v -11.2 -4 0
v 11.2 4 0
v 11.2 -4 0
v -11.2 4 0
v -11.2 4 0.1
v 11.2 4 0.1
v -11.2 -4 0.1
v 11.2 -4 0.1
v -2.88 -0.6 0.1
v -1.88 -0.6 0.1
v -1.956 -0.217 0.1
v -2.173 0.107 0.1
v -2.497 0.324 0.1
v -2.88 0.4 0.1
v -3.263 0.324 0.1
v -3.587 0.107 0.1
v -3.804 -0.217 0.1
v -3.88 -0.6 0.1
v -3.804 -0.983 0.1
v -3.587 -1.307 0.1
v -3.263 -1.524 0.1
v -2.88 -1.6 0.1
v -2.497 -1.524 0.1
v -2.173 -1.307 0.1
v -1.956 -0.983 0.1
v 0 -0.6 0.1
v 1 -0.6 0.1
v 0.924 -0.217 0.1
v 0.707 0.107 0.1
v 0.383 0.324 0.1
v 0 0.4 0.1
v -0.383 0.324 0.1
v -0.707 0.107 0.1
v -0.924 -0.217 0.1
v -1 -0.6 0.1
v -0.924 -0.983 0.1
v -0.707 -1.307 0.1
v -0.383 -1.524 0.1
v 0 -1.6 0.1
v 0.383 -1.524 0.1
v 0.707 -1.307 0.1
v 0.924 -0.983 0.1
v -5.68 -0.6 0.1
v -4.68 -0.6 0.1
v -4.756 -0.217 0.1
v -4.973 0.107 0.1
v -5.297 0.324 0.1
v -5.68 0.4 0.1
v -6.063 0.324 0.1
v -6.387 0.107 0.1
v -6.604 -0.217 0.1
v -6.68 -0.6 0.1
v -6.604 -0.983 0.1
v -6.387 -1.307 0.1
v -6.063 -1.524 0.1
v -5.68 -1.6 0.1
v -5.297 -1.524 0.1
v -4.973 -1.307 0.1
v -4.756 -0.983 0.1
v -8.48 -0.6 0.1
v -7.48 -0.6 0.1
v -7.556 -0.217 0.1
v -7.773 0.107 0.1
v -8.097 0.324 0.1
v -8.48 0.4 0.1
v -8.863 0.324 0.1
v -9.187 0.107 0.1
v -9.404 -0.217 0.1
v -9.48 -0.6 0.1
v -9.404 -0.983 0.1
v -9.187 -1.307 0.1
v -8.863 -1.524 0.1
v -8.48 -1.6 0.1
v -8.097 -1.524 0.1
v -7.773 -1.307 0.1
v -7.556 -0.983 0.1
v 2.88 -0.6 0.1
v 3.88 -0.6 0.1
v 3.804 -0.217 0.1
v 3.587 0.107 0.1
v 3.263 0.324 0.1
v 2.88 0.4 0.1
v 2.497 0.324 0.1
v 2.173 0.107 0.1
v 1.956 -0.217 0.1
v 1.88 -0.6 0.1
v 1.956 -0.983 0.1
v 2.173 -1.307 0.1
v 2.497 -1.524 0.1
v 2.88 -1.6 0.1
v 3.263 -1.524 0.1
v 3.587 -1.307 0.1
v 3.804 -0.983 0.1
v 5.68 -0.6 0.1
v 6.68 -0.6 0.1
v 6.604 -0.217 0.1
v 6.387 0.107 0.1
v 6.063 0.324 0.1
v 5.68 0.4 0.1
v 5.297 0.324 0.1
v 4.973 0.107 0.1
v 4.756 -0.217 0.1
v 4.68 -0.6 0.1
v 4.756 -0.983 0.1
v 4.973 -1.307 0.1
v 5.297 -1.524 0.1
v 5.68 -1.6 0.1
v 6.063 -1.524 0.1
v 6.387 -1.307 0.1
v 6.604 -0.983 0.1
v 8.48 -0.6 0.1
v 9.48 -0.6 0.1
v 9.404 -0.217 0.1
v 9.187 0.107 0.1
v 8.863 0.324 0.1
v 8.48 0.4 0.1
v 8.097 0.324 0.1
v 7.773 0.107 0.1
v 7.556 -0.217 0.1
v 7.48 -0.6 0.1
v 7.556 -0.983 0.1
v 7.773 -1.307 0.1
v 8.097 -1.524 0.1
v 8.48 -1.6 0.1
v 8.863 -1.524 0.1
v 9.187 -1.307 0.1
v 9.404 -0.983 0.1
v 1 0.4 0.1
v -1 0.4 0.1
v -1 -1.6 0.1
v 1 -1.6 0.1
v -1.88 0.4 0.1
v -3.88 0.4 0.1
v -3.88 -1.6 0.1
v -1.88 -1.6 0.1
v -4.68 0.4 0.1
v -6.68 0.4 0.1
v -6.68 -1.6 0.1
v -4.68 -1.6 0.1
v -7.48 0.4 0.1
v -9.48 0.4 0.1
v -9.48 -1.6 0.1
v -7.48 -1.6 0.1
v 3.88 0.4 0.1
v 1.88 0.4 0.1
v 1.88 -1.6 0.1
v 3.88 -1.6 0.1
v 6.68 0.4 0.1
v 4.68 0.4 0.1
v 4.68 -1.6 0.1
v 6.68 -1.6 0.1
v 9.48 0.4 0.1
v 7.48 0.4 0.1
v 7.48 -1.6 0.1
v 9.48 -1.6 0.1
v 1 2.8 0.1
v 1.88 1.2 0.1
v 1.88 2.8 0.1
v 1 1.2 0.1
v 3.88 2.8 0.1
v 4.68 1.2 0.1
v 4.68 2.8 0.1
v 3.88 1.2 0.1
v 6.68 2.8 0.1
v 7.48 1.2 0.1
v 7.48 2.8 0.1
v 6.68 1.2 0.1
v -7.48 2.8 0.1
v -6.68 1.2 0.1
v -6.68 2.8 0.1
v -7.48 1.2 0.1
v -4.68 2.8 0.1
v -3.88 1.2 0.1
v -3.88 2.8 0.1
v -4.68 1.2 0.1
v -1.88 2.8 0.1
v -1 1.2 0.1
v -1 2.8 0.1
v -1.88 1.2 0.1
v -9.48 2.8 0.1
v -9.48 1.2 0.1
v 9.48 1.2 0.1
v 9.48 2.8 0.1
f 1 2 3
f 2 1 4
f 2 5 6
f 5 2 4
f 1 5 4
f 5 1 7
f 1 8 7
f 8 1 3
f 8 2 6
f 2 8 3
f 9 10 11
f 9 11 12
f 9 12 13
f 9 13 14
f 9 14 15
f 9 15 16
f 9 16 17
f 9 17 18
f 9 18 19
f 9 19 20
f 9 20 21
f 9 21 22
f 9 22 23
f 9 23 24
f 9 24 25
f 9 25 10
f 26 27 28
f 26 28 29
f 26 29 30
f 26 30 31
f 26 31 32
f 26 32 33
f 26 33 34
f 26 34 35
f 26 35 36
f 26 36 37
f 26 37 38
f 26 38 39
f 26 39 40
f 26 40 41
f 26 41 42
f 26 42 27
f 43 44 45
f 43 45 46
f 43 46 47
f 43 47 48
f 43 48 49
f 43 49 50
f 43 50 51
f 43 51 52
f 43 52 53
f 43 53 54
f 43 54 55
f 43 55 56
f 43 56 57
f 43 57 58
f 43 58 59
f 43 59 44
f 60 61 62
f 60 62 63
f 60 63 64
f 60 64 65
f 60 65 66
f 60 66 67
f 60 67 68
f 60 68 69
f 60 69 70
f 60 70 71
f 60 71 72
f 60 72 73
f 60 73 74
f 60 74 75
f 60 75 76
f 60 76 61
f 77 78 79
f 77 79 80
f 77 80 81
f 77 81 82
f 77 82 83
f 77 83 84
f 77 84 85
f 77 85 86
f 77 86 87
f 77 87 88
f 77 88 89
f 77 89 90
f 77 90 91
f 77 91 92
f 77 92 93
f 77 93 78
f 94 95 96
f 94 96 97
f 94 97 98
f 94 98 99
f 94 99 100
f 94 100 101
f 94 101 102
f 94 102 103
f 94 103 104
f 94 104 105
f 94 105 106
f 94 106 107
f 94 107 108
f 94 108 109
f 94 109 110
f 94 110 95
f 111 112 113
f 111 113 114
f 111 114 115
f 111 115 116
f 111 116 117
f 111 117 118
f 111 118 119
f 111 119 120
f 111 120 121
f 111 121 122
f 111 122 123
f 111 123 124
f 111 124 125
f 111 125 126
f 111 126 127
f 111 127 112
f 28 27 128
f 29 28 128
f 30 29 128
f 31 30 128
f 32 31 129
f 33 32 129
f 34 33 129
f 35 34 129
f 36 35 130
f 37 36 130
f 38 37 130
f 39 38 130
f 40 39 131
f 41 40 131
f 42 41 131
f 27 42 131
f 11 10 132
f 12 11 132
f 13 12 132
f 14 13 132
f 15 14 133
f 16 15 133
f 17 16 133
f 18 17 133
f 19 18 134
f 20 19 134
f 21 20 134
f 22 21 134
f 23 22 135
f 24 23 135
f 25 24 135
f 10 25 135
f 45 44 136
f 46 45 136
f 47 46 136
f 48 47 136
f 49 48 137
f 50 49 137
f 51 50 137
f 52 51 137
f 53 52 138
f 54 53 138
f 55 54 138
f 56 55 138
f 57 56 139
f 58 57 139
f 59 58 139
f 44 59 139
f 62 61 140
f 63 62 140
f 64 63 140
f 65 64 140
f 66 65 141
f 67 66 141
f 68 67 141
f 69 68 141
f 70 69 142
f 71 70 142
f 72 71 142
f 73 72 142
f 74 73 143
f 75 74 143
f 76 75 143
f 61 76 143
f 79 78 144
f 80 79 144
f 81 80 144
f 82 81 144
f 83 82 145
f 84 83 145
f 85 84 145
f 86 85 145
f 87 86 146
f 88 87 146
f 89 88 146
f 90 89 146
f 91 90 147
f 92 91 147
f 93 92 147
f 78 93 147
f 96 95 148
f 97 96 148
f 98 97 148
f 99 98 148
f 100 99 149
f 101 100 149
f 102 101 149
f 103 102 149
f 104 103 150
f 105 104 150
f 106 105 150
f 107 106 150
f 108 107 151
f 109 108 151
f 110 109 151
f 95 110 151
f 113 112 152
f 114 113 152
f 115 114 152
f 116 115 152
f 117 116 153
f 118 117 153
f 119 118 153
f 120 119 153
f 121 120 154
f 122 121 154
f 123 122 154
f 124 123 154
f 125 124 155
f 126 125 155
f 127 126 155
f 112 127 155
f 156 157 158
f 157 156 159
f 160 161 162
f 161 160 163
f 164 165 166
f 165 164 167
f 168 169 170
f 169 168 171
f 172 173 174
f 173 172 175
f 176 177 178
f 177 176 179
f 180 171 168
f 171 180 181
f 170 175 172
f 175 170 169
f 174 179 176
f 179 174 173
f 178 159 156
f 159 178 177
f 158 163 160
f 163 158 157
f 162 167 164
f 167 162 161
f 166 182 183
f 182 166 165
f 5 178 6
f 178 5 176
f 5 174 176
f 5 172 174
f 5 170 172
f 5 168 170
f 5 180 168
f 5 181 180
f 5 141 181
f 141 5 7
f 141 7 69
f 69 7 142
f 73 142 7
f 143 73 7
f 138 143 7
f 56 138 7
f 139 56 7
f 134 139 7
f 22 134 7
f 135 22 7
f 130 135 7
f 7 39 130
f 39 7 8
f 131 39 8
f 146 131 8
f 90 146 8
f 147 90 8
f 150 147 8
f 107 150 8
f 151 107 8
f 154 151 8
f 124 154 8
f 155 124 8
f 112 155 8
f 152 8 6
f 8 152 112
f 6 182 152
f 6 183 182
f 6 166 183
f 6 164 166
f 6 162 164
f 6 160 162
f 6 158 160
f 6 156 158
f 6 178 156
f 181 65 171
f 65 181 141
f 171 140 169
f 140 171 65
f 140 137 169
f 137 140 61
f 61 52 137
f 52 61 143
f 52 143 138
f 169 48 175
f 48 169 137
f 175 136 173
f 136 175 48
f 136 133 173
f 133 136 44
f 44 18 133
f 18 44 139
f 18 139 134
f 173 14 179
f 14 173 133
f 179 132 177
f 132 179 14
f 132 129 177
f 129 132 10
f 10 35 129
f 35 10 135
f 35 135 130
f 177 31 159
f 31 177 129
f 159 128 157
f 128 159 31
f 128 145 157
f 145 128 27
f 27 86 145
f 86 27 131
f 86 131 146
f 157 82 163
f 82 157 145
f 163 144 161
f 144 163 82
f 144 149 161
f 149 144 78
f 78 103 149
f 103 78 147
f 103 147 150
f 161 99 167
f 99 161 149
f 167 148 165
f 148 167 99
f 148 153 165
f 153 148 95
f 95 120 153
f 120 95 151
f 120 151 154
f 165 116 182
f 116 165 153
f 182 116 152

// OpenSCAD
// file: ../p/4-4edge.scad
use <../lib.scad>
$fa=1; $fs=0.2;
function ldraw_lib__4_4edge(realsolid=false) = [
// 0 Circle 1.0
// 0 Name: 4-4edge.dat
// 0 Author: James Jessiman
// 0 !LDRAW_ORG Primitive UPDATE 2017-01
// 0 !LICENSE Licensed under CC BY 2.0 and CC BY 4.0 : see CAreadme.txt
// 
// 0 BFC CERTIFY CCW
  [0,"BFC","CERTIFY"],
  [0,"BFC","CCW"],
// 
// 0 !HISTORY 1998-12-15 [PTadmin] Official Update 1998-10
// 0 !HISTORY 2005-12-28 [PTadmin] Official Update 2005-01
// 0 !HISTORY 2007-06-24 [PTadmin] Header formatted for Contributor Agreement
// 0 !HISTORY 2008-07-01 [PTadmin] Official Update 2008-01
// 0 !HISTORY 2017-01-15 [Steffen] BFCed
// 0 !HISTORY 2017-12-30 [PTadmin] Official Update 2017-01
// 
// 
// 2 24 1 0 0 0.9239 0 0.3827
  [2,24,1,0,0,0.9239,0,0.3827],
// 2 24 0.9239 0 0.3827 0.7071 0 0.7071
  [2,24,0.9239,0,0.3827,0.7071,0,0.7071],
// 2 24 0.7071 0 0.7071 0.3827 0 0.9239
  [2,24,0.7071,0,0.7071,0.3827,0,0.9239],
// 2 24 0.3827 0 0.9239 0 0 1
  [2,24,0.3827,0,0.9239,0,0,1],
// 2 24 0 0 1 -0.3827 0 0.9239
  [2,24,0,0,1,-0.3827,0,0.9239],
// 2 24 -0.3827 0 0.9239 -0.7071 0 0.7071
  [2,24,-0.3827,0,0.9239,-0.7071,0,0.7071],
// 2 24 -0.7071 0 0.7071 -0.9239 0 0.3827
  [2,24,-0.7071,0,0.7071,-0.9239,0,0.3827],
// 2 24 -0.9239 0 0.3827 -1 0 -0
  [2,24,-0.9239,0,0.3827,-1,0,-0],
// 2 24 -1 0 -0 -0.9239 0 -0.3827
  [2,24,-1,0,-0,-0.9239,0,-0.3827],
// 2 24 -0.9239 0 -0.3827 -0.7071 0 -0.7071
  [2,24,-0.9239,0,-0.3827,-0.7071,0,-0.7071],
// 2 24 -0.7071 0 -0.7071 -0.3827 0 -0.9239
  [2,24,-0.7071,0,-0.7071,-0.3827,0,-0.9239],
// 2 24 -0.3827 0 -0.9239 0 0 -1
  [2,24,-0.3827,0,-0.9239,0,0,-1],
// 2 24 0 0 -1 0.3827 0 -0.9239
  [2,24,0,0,-1,0.3827,0,-0.9239],
// 2 24 0.3827 0 -0.9239 0.7071 0 -0.7071
  [2,24,0.3827,0,-0.9239,0.7071,0,-0.7071],
// 2 24 0.7071 0 -0.7071 0.9239 0 -0.3827
  [2,24,0.7071,0,-0.7071,0.9239,0,-0.3827],
// 2 24 0.9239 0 -0.3827 1 0 0
  [2,24,0.9239,0,-0.3827,1,0,0],
];
module ldraw_lib__4_4edge(step=0, col=false, unit=2/5, alt=false, line=0.2, solid=!$preview)
    makepoly(ldraw_lib__4_4edge(solid), step=step, col=col, unit=unit, alt=alt, line=line, solid=solid);
ldraw_lib__4_4edge(line=0.2);
// file: ../p/4-4cyli.scad
use <../lib.scad>
$fa=1; $fs=0.2;
function ldraw_lib__4_4cyli(realsolid=false) = [
// 0 Cylinder 1.0
// 0 Name: 4-4cyli.dat
// 0 Author: James Jessiman
// 0 !LDRAW_ORG Primitive UPDATE 2005-01
// 0 !LICENSE Licensed under CC BY 2.0 and CC BY 4.0 : see CAreadme.txt
// 
// 0 BFC CERTIFY CCW
  [0,"BFC","CERTIFY"],
  [0,"BFC","CCW"],
// 
// 0 !HISTORY 1998-12-15 [PTadmin] Official Update 1998-10
// 0 !HISTORY 2002-03-23 [sbliss] Added BFC statement; merged headers from files in distributions LDraw 0.27 and Complete.
// 0 !HISTORY 2002-04-25 [PTadmin] Official Update 2002-02
// 0 !HISTORY 2004-12-14 [guyvivan] BFC CCW
// 0 !HISTORY 2005-12-28 [PTadmin] Official Update 2005-01
// 0 !HISTORY 2007-06-24 [PTadmin] Header formatted for Contributor Agreement
// 0 !HISTORY 2008-07-01 [PTadmin] Official Update 2008-01
// 
// 
// 4 16 1 1 0 0.9239 1 0.3827 0.9239 0 0.3827 1 0 0
  [4,16,1,1,0,0.9239,1,0.3827,0.9239,0,0.3827,1,0,0],
// 5 24 1 0 0 1 1 0 0.9239 0 0.3827 0.9239 0 -0.3827
  [5,24,1,0,0,1,1,0,0.9239,0,0.3827,0.9239,0,-0.3827],
// 4 16 0.9239 1 0.3827 0.7071 1 0.7071 0.7071 0 0.7071 0.9239 0 0.3827
  [4,16,0.9239,1,0.3827,0.7071,1,0.7071,0.7071,0,0.7071,0.9239,0,0.3827],
// 5 24 0.9239 0 0.3827 0.9239 1 0.3827 0.7071 0 0.7071 1 0 0
  [5,24,0.9239,0,0.3827,0.9239,1,0.3827,0.7071,0,0.7071,1,0,0],
// 4 16 0.7071 1 0.7071 0.3827 1 0.9239 0.3827 0 0.9239 0.7071 0 0.7071
  [4,16,0.7071,1,0.7071,0.3827,1,0.9239,0.3827,0,0.9239,0.7071,0,0.7071],
// 5 24 0.7071 0 0.7071 0.7071 1 0.7071 0.3827 0 0.9239 0.9239 0 0.3827
  [5,24,0.7071,0,0.7071,0.7071,1,0.7071,0.3827,0,0.9239,0.9239,0,0.3827],
// 4 16 0.3827 1 0.9239 0 1 1 0 0 1 0.3827 0 0.9239
  [4,16,0.3827,1,0.9239,0,1,1,0,0,1,0.3827,0,0.9239],
// 5 24 0.3827 0 0.9239 0.3827 1 0.9239 0 0 1 0.7071 0 0.7071
  [5,24,0.3827,0,0.9239,0.3827,1,0.9239,0,0,1,0.7071,0,0.7071],
// 4 16 0 1 1 -0.3827 1 0.9239 -0.3827 0 0.9239 0 0 1
  [4,16,0,1,1,-0.3827,1,0.9239,-0.3827,0,0.9239,0,0,1],
// 5 24 0 0 1 0 1 1 -0.3827 0 0.9239 0.3827 0 0.9239
  [5,24,0,0,1,0,1,1,-0.3827,0,0.9239,0.3827,0,0.9239],
// 4 16 -0.3827 1 0.9239 -0.7071 1 0.7071 -0.7071 0 0.7071 -0.3827 0 0.9239
  [4,16,-0.3827,1,0.9239,-0.7071,1,0.7071,-0.7071,0,0.7071,-0.3827,0,0.9239],
// 5 24 -0.3827 0 0.9239 -0.3827 1 0.9239 -0.7071 0 0.7071 0 0 1
  [5,24,-0.3827,0,0.9239,-0.3827,1,0.9239,-0.7071,0,0.7071,0,0,1],
// 4 16 -0.7071 1 0.7071 -0.9239 1 0.3827 -0.9239 0 0.3827 -0.7071 0 0.7071
  [4,16,-0.7071,1,0.7071,-0.9239,1,0.3827,-0.9239,0,0.3827,-0.7071,0,0.7071],
// 5 24 -0.7071 0 0.7071 -0.7071 1 0.7071 -0.9239 0 0.3827 -0.3827 0 0.9239
  [5,24,-0.7071,0,0.7071,-0.7071,1,0.7071,-0.9239,0,0.3827,-0.3827,0,0.9239],
// 4 16 -0.9239 1 0.3827 -1 1 0 -1 0 0 -0.9239 0 0.3827
  [4,16,-0.9239,1,0.3827,-1,1,0,-1,0,0,-0.9239,0,0.3827],
// 5 24 -0.9239 0 0.3827 -0.9239 1 0.3827 -1 0 0 -0.7071 0 0.7071
  [5,24,-0.9239,0,0.3827,-0.9239,1,0.3827,-1,0,0,-0.7071,0,0.7071],
// 4 16 -1 1 0 -0.9239 1 -0.3827 -0.9239 0 -0.3827 -1 0 0
  [4,16,-1,1,0,-0.9239,1,-0.3827,-0.9239,0,-0.3827,-1,0,0],
// 5 24 -1 0 0 -1 1 0 -0.9239 0 -0.3827 -0.9239 0 0.3827
  [5,24,-1,0,0,-1,1,0,-0.9239,0,-0.3827,-0.9239,0,0.3827],
// 4 16 -0.9239 1 -0.3827 -0.7071 1 -0.7071 -0.7071 0 -0.7071 -0.9239 0 -0.3827
  [4,16,-0.9239,1,-0.3827,-0.7071,1,-0.7071,-0.7071,0,-0.7071,-0.9239,0,-0.3827],
// 5 24 -0.9239 0 -0.3827 -0.9239 1 -0.3827 -0.7071 0 -0.7071 -1 0 0
  [5,24,-0.9239,0,-0.3827,-0.9239,1,-0.3827,-0.7071,0,-0.7071,-1,0,0],
// 4 16 -0.7071 1 -0.7071 -0.3827 1 -0.9239 -0.3827 0 -0.9239 -0.7071 0 -0.7071
  [4,16,-0.7071,1,-0.7071,-0.3827,1,-0.9239,-0.3827,0,-0.9239,-0.7071,0,-0.7071],
// 5 24 -0.7071 0 -0.7071 -0.7071 1 -0.7071 -0.3827 0 -0.9239 -0.9239 0 -0.3827
  [5,24,-0.7071,0,-0.7071,-0.7071,1,-0.7071,-0.3827,0,-0.9239,-0.9239,0,-0.3827],
// 4 16 -0.3827 1 -0.9239 0 1 -1 0 0 -1 -0.3827 0 -0.9239
  [4,16,-0.3827,1,-0.9239,0,1,-1,0,0,-1,-0.3827,0,-0.9239],
// 5 24 -0.3827 0 -0.9239 -0.3827 1 -0.9239 0 0 -1 -0.7071 0 -0.7071
  [5,24,-0.3827,0,-0.9239,-0.3827,1,-0.9239,0,0,-1,-0.7071,0,-0.7071],
// 4 16 0 1 -1 0.3827 1 -0.9239 0.3827 0 -0.9239 0 0 -1
  [4,16,0,1,-1,0.3827,1,-0.9239,0.3827,0,-0.9239,0,0,-1],
// 5 24 0 0 -1 0 1 -1 0.3827 0 -0.9239 -0.3827 0 -0.9239
  [5,24,0,0,-1,0,1,-1,0.3827,0,-0.9239,-0.3827,0,-0.9239],
// 4 16 0.3827 1 -0.9239 0.7071 1 -0.7071 0.7071 0 -0.7071 0.3827 0 -0.9239
  [4,16,0.3827,1,-0.9239,0.7071,1,-0.7071,0.7071,0,-0.7071,0.3827,0,-0.9239],
// 5 24 0.3827 0 -0.9239 0.3827 1 -0.9239 0.7071 0 -0.7071 0 0 -1
  [5,24,0.3827,0,-0.9239,0.3827,1,-0.9239,0.7071,0,-0.7071,0,0,-1],
// 4 16 0.7071 1 -0.7071 0.9239 1 -0.3827 0.9239 0 -0.3827 0.7071 0 -0.7071
  [4,16,0.7071,1,-0.7071,0.9239,1,-0.3827,0.9239,0,-0.3827,0.7071,0,-0.7071],
// 5 24 0.7071 0 -0.7071 0.7071 1 -0.7071 0.9239 0 -0.3827 0.3827 0 -0.9239
  [5,24,0.7071,0,-0.7071,0.7071,1,-0.7071,0.9239,0,-0.3827,0.3827,0,-0.9239],
// 4 16 0.9239 1 -0.3827 1 1 0 1 0 0 0.9239 0 -0.3827
  [4,16,0.9239,1,-0.3827,1,1,0,1,0,0,0.9239,0,-0.3827],
// 5 24 0.9239 0 -0.3827 0.9239 1 -0.3827 1 0 0 0.7071 0 -0.7071
  [5,24,0.9239,0,-0.3827,0.9239,1,-0.3827,1,0,0,0.7071,0,-0.7071],
// 0
];
module ldraw_lib__4_4cyli(step=0, col=false, unit=2/5, alt=false, line=0.2, solid=!$preview)
    makepoly(ldraw_lib__4_4cyli(solid), step=step, col=col, unit=unit, alt=alt, line=line, solid=solid);
ldraw_lib__4_4cyli(line=0.2);
// file: ../p/stud3.scad
use <../lib.scad>
use <4-4cyli.scad>
use <4-4disc.scad>
use <4-4edge.scad>
$fa=1; $fs=0.2;
function ldraw_lib__stud3(realsolid=false) = realsolid ? 
    [openscad(translate([0,0,-eps()], o=cylinder(4+eps(), r=4)),2)] : [
// 0 Stud Tube Solid
// 0 Name: stud3.dat
// 0 Author: James Jessiman
// 0 !LDRAW_ORG Primitive UPDATE 2012-01
// 0 !LICENSE Licensed under CC BY 2.0 and CC BY 4.0 : see CAreadme.txt
// 
// 0 BFC CERTIFY CCW
  [0,"BFC","CERTIFY"],
  [0,"BFC","CCW"],
// 
// 0 !HISTORY 2002-04-04 [sbliss] Modified for BFC compliance
// 0 !HISTORY 2002-04-25 [PTadmin] Official Update 2002-02
// 0 !HISTORY 2007-06-24 [PTadmin] Header formatted for Contributor Agreement
// 0 !HISTORY 2008-07-01 [PTadmin] Official Update 2008-01
// 0 !HISTORY 2012-02-16 [Philo] Changed to CCW
// 0 !HISTORY 2012-03-30 [PTadmin] Official Update 2012-01
// 
// 
// 1 16 0 -4 0 4 0 0 0 1 0 0 0 4 4-4edge.dat
  [1,16,0,-4,0,4,0,0,0,1,0,0,0,4, ldraw_lib__4_4edge(realsolid)],
// 1 16 0 0 0 4 0 0 0 1 0 0 0 4 4-4edge.dat
  [1,16,0,0,0,4,0,0,0,1,0,0,0,4, ldraw_lib__4_4edge(realsolid)],
// 1 16 0 -4 0 4 0 0 0 1 0 0 0 4 4-4disc.dat
  [1,16,0,-4,0,4,0,0,0,1,0,0,0,4, ldraw_lib__4_4disc(realsolid)],
// 1 16 0 -4 0 4 0 0 0 4 0 0 0 4 4-4cyli.dat
  [1,16,0,-4,0,4,0,0,0,4,0,0,0,4, ldraw_lib__4_4cyli(realsolid)],
];
module ldraw_lib__stud3(step=0, col=false, unit=2/5, alt=false, line=0.2, solid=!$preview)
    makepoly(ldraw_lib__stud3(solid), step=step, col=col, unit=unit, alt=alt, line=line, solid=solid);
ldraw_lib__stud3(line=0.2);
// file: ../p/stud.scad
use <../lib.scad>
use <4-4cyli.scad>
use <4-4disc.scad>
use <4-4edge.scad>
$fa=1; $fs=0.2;
function ldraw_lib__stud(realsolid=false) = realsolid ? 
    [openscad(translate([0,0,-eps()], o=cylinder(4+eps(), r=6)),2)] : [
// 0 Stud
// 0 Name: stud.dat
// 0 Author: James Jessiman
// 0 !LDRAW_ORG Primitive UPDATE 2012-01
// 0 !LICENSE Licensed under CC BY 2.0 and CC BY 4.0 : see CAreadme.txt
// 
// 0 BFC CERTIFY CCW
  [0,"BFC","CERTIFY"],
  [0,"BFC","CCW"],
// 
// 0 !HISTORY 2002-04-04 [sbliss] Modified for BFC compliance
// 0 !HISTORY 2002-04-25 [PTadmin] Official Update 2002-02
// 0 !HISTORY 2007-06-24 [PTadmin] Header formatted for Contributor Agreement
// 0 !HISTORY 2008-07-01 [PTadmin] Official Update 2008-01
// 0 !HISTORY 2012-02-16 [Philo] Changed to CCW
// 0 !HISTORY 2012-03-30 [PTadmin] Official Update 2012-01
// 
// 
// 1 16 0 0 0 6 0 0 0 1 0 0 0 6 4-4edge.dat
  [1,16,0,0,0,6,0,0,0,1,0,0,0,6, ldraw_lib__4_4edge(realsolid)],
// 1 16 0 -4 0 6 0 0 0 1 0 0 0 6 4-4edge.dat
  [1,16,0,-4,0,6,0,0,0,1,0,0,0,6, ldraw_lib__4_4edge(realsolid)],
// 1 16 0 0 0 6 0 0 0 -4 0 0 0 6 4-4cyli.dat
  [1,16,0,0,0,6,0,0,0,-4,0,0,0,6, ldraw_lib__4_4cyli(realsolid)],
// 1 16 0 -4 0 6 0 0 0 1 0 0 0 6 4-4disc.dat
  [1,16,0,-4,0,6,0,0,0,1,0,0,0,6, ldraw_lib__4_4disc(realsolid)],
];
module ldraw_lib__stud(step=0, col=false, unit=2/5, alt=false, line=0.2, solid=!$preview)
    makepoly(ldraw_lib__stud(solid), step=step, col=col, unit=unit, alt=alt, line=line, solid=solid);
ldraw_lib__stud(line=0.2);
// file: ../p/box5.scad
use <../lib.scad>
$fa=1; $fs=0.2;
function ldraw_lib__box5(realsolid=false) = [
// 0 Box with 5 Faces and All Edges
// 0 Name: box5.dat
// 0 Author: James Jessiman
// 0 !LDRAW_ORG Primitive UPDATE 2012-01
// 0 !LICENSE Licensed under CC BY 2.0 and CC BY 4.0 : see CAreadme.txt
// 
// 0 BFC CERTIFY CCW
  [0,"BFC","CERTIFY"],
  [0,"BFC","CCW"],
// 
// 0 !HISTORY 2002-04-03 [sbliss] Modified for BFC compliance
// 0 !HISTORY 2002-04-25 [PTadmin] Official Update 2002-02
// 0 !HISTORY 2007-06-24 [PTadmin] Header formatted for Contributor Agreement
// 0 !HISTORY 2008-07-01 [PTadmin] Official Update 2008-01
// 0 !HISTORY 2012-02-16 [Philo] Changed to CCW
// 0 !HISTORY 2012-03-30 [PTadmin] Official Update 2012-01
// 
// 
// 2 24 1 1 1 -1 1 1
  [2,24,1,1,1,-1,1,1],
// 2 24 -1 1 1 -1 1 -1
  [2,24,-1,1,1,-1,1,-1],
// 2 24 -1 1 -1 1 1 -1
  [2,24,-1,1,-1,1,1,-1],
// 2 24 1 1 -1 1 1 1
  [2,24,1,1,-1,1,1,1],
// 2 24 1 0 1 -1 0 1
  [2,24,1,0,1,-1,0,1],
// 2 24 -1 0 1 -1 0 -1
  [2,24,-1,0,1,-1,0,-1],
// 2 24 -1 0 -1 1 0 -1
  [2,24,-1,0,-1,1,0,-1],
// 2 24 1 0 -1 1 0 1
  [2,24,1,0,-1,1,0,1],
// 2 24 1 0 1 1 1 1
  [2,24,1,0,1,1,1,1],
// 2 24 -1 0 1 -1 1 1
  [2,24,-1,0,1,-1,1,1],
// 2 24 1 0 -1 1 1 -1
  [2,24,1,0,-1,1,1,-1],
// 2 24 -1 0 -1 -1 1 -1
  [2,24,-1,0,-1,-1,1,-1],
// 4 16 -1 1 1 1 1 1 1 1 -1 -1 1 -1
  [4,16,-1,1,1,1,1,1,1,1,-1,-1,1,-1],
// 4 16 -1 1 1 -1 0 1 1 0 1 1 1 1
  [4,16,-1,1,1,-1,0,1,1,0,1,1,1,1],
// 4 16 -1 1 -1 -1 0 -1 -1 0 1 -1 1 1
  [4,16,-1,1,-1,-1,0,-1,-1,0,1,-1,1,1],
// 4 16 1 1 -1 1 0 -1 -1 0 -1 -1 1 -1
  [4,16,1,1,-1,1,0,-1,-1,0,-1,-1,1,-1],
// 4 16 1 1 1 1 0 1 1 0 -1 1 1 -1
  [4,16,1,1,1,1,0,1,1,0,-1,1,1,-1],
];
module ldraw_lib__box5(step=0, col=false, unit=2/5, alt=false, line=0.2, solid=!$preview)
    makepoly(ldraw_lib__box5(solid), step=step, col=col, unit=unit, alt=alt, line=line, solid=solid);
ldraw_lib__box5(line=0.2);
// file: ../p/box4t.scad
use <../lib.scad>
$fa=1; $fs=0.2;
function ldraw_lib__box4t(realsolid=false) = [
// 0 Box with 4 Adjacent Faces and All Edges
// 0 Name: box4t.dat
// 0 Author: Tore Eriksson [Tore_Eriksson]
// 0 !LDRAW_ORG Primitive UPDATE 2003-02
// 0 !LICENSE Licensed under CC BY 2.0 and CC BY 4.0 : see CAreadme.txt
// 
// 0 BFC CERTIFY CCW
  [0,"BFC","CERTIFY"],
  [0,"BFC","CCW"],
// 
// 0 !HISTORY 1997-09-29 [PTadmin] Official Update 1997-15
// 0 !HISTORY 2002-08-31 [izanette] Modified with WINDZ for BFC compliance
// 0 !HISTORY 2003-08-01 [PTadmin] Official Update 2003-02
// 0 !HISTORY 2007-06-24 [PTadmin] Header formatted for Contributor Agreement
// 0 !HISTORY 2008-07-01 [PTadmin] Official Update 2008-01
// 
// 
// 2 24 1 1 1 -1 1 1
  [2,24,1,1,1,-1,1,1],
// 2 24 -1 1 1 -1 1 -1
  [2,24,-1,1,1,-1,1,-1],
// 2 24 -1 1 -1 1 1 -1
  [2,24,-1,1,-1,1,1,-1],
// 2 24 1 1 -1 1 1 1
  [2,24,1,1,-1,1,1,1],
// 2 24 1 0 1 -1 0 1
  [2,24,1,0,1,-1,0,1],
// 2 24 -1 0 1 -1 0 -1
  [2,24,-1,0,1,-1,0,-1],
// 2 24 -1 0 -1 1 0 -1
  [2,24,-1,0,-1,1,0,-1],
// 2 24 1 0 -1 1 0 1
  [2,24,1,0,-1,1,0,1],
// 2 24 1 0 1 1 1 1
  [2,24,1,0,1,1,1,1],
// 2 24 -1 0 1 -1 1 1
  [2,24,-1,0,1,-1,1,1],
// 2 24 1 0 -1 1 1 -1
  [2,24,1,0,-1,1,1,-1],
// 2 24 -1 0 -1 -1 1 -1
  [2,24,-1,0,-1,-1,1,-1],
// 4 16 1 1 1 1 1 -1 -1 1 -1 -1 1 1
  [4,16,1,1,1,1,1,-1,-1,1,-1,-1,1,1],
// 4 16 1 1 1 -1 1 1 -1 0 1 1 0 1
  [4,16,1,1,1,-1,1,1,-1,0,1,1,0,1],
// 4 16 -1 1 1 -1 1 -1 -1 0 -1 -1 0 1
  [4,16,-1,1,1,-1,1,-1,-1,0,-1,-1,0,1],
// 0 4 16 -1 1 -1 -1 0 -1 1 0 -1 1 1 -1
// 4 16 1 1 -1 1 1 1 1 0 1 1 0 -1
  [4,16,1,1,-1,1,1,1,1,0,1,1,0,-1],
// 0
];
module ldraw_lib__box4t(step=0, col=false, unit=2/5, alt=false, line=0.2, solid=!$preview)
    makepoly(ldraw_lib__box4t(solid), step=step, col=col, unit=unit, alt=alt, line=line, solid=solid);
ldraw_lib__box4t(line=0.2);
// file: s/3004s01.scad
use <../../lib.scad>
use <../../p/box4t.scad>
use <../../p/box5.scad>
use <../../p/stud.scad>
use <../../p/stud3.scad>
$fa=1; $fs=0.2;
function ldraw_lib__s__3004s01(realsolid=false) = [
// 0 ~Brick  1 x  2 without Front Face
// 0 Name: s\3004s01.dat
// 0 Author: James Jessiman
// 0 !LDRAW_ORG Subpart UPDATE 2003-03
// 0 !LICENSE Licensed under CC BY 2.0 and CC BY 4.0 : see CAreadme.txt
// 
// 0 BFC CERTIFY CCW
  [0,"BFC","CERTIFY"],
  [0,"BFC","CCW"],
// 
// 0 !HISTORY 2003-09-07 [jriley] Subfiling, BFC
// 0 !HISTORY 2003-12-19 [PTadmin] Official Update 2003-03
// 0 !HISTORY 2007-08-29 [PTadmin] Header formatted for Contributor Agreement
// 0 !HISTORY 2008-07-01 [PTadmin] Official Update 2008-01
// 
// 
// 1 16 0 4 0 1 0 0 0 -5 0 0 0 1 stud3.dat
  [1,16,0,4,0,1,0,0,0,-5,0,0,0,1, ldraw_lib__stud3(realsolid)],
// 0 BFC INVERTNEXT
  [0,"BFC","INVERTNEXT"],
// 1 16 0 24 0 16 0 0 0 -20 0 0 0 6 box5.dat
  [1,16,0,24,0,16,0,0,0,-20,0,0,0,6, ldraw_lib__box5(realsolid)],
// 4 16 20 24 10 16 24 6 -16 24 6 -20 24 10
  [4,16,20,24,10,16,24,6,-16,24,6,-20,24,10],
// 4 16 -20 24 10 -16 24 6 -16 24 -6 -20 24 -10
  [4,16,-20,24,10,-16,24,6,-16,24,-6,-20,24,-10],
// 4 16 -20 24 -10 -16 24 -6 16 24 -6 20 24 -10
  [4,16,-20,24,-10,-16,24,-6,16,24,-6,20,24,-10],
// 4 16 20 24 -10 16 24 -6 16 24 6 20 24 10
  [4,16,20,24,-10,16,24,-6,16,24,6,20,24,10],
// 1 16 0 24 0 20 0 0 0 -24 0 0 0 10 box4t.dat
  [1,16,0,24,0,20,0,0,0,-24,0,0,0,10, ldraw_lib__box4t(realsolid)],
// 1 16 10 0 0 1 0 0 0 1 0 0 0 1 stud.dat
  [1,16,10,0,0,1,0,0,0,1,0,0,0,1, ldraw_lib__stud(realsolid)],
// 1 16 -10 0 0 1 0 0 0 1 0 0 0 1 stud.dat
  [1,16,-10,0,0,1,0,0,0,1,0,0,0,1, ldraw_lib__stud(realsolid)],
// 0
];
module ldraw_lib__s__3004s01(step=0, col=false, unit=2/5, alt=false, line=0.2, solid=!$preview)
    makepoly(ldraw_lib__s__3004s01(solid), step=step, col=col, unit=unit, alt=alt, line=line, solid=solid);
ldraw_lib__s__3004s01(line=0.2);
// file: 3004.scad
use <../lib.scad>
use <s/3004s01.scad>
$fa=1; $fs=0.2;
function ldraw_lib__3004(realsolid=false) = [
// 0 Brick  1 x  2
// 0 Name: 3004.dat
// 0 Author: James Jessiman
// 0 !LDRAW_ORG Part UPDATE 2022-05
// 0 !LICENSE Licensed under CC BY 2.0 and CC BY 4.0 : see CAreadme.txt
// 
// 0 BFC CERTIFY CCW
  [0,"BFC","CERTIFY"],
  [0,"BFC","CCW"],
// 
// 0 !HISTORY 2001-10-26 [PTadmin] Official Update 2001-01
// 0 !HISTORY 2002-05-07 {unknown} BFC Certification
// 0 !HISTORY 2002-06-11 [PTadmin] Official Update 2002-03
// 0 !HISTORY 2007-05-07 [PTadmin] Header formatted for Contributor Agreement
// 0 !HISTORY 2008-07-01 [PTadmin] Official Update 2008-01
// 0 !HISTORY 2022-08-04 [MagFors] Using subfile
// 0 !HISTORY 2022-09-15 [PTadmin] Official Update 2022-05
// 
// 
// 1 16 0 0 0 1 0 0 0 1 0 0 0 1 s\3004s01.dat
  [1,16,0,0,0,1,0,0,0,1,0,0,0,1, ldraw_lib__s__3004s01(realsolid)],
// 4 16 -20 24 -10 20 24 -10 20 0 -10 -20 0 -10
  [4,16,-20,24,-10,20,24,-10,20,0,-10,-20,0,-10],
];
module ldraw_lib__3004(step=0, col=false, unit=2/5, alt=false, line=0.2, solid=!$preview)
    makepoly(ldraw_lib__3004(solid), step=step, col=col, unit=unit, alt=alt, line=line, solid=solid);
ldraw_lib__3004(line=0.2);
// file: ../p/box5-12.scad
use <../lib.scad>
$fa=1; $fs=0.2;
function ldraw_lib__box5_12(realsolid=false) = [
// 0 Box with 5 Faces without Any Edges
// 0 Name: box5-12.dat
// 0 Author: Chris Dee [cwdee]
// 0 !LDRAW_ORG Primitive UPDATE 2009-02
// 0 !LICENSE Licensed under CC BY 2.0 and CC BY 4.0 : see CAreadme.txt
// 
// 0 BFC CERTIFY CCW
  [0,"BFC","CERTIFY"],
  [0,"BFC","CCW"],
// 
// 0 !HISTORY 2009-09-03 [PTadmin] Official Update 2009-02
// 
// 
// 4 16 1 1 1 1 1 -1 -1 1 -1 -1 1 1
  [4,16,1,1,1,1,1,-1,-1,1,-1,-1,1,1],
// 4 16 -1 0 1 1 0 1 1 1 1 -1 1 1
  [4,16,-1,0,1,1,0,1,1,1,1,-1,1,1],
// 4 16 -1 0 -1 -1 0 1 -1 1 1 -1 1 -1
  [4,16,-1,0,-1,-1,0,1,-1,1,1,-1,1,-1],
// 4 16 1 0 -1 -1 0 -1 -1 1 -1 1 1 -1
  [4,16,1,0,-1,-1,0,-1,-1,1,-1,1,1,-1],
// 4 16 1 0 1 1 0 -1 1 1 -1 1 1 1
  [4,16,1,0,1,1,0,-1,1,1,-1,1,1,1],
// 0
];
module ldraw_lib__box5_12(step=0, col=false, unit=2/5, alt=false, line=0.2, solid=!$preview)
    makepoly(ldraw_lib__box5_12(solid), step=step, col=col, unit=unit, alt=alt, line=line, solid=solid);
ldraw_lib__box5_12(line=0.2);
// file: ../p/4-4ndis.scad
use <../lib.scad>
$fa=1; $fs=0.2;
function ldraw_lib__4_4ndis(realsolid=false) = [
// 0 Disc Negative 1.0
// 0 Name: 4-4ndis.dat
// 0 Author: James Jessiman
// 0 !LDRAW_ORG Primitive UPDATE 2012-01
// 0 !LICENSE Licensed under CC BY 2.0 and CC BY 4.0 : see CAreadme.txt
// 
// 0 BFC CERTIFY CCW
  [0,"BFC","CERTIFY"],
  [0,"BFC","CCW"],
// 
// 0 !HISTORY 2002-03-23 [sbliss] Added BFC statement; compacted code
// 0 !HISTORY 2002-04-25 [PTadmin] Official Update 2002-02
// 0 !HISTORY 2007-06-24 [PTadmin] Header formatted for Contributor Agreement
// 0 !HISTORY 2008-07-01 [PTadmin] Official Update 2008-01
// 0 !HISTORY 2012-02-16 [Philo] Changed to CCW
// 0 !HISTORY 2012-03-30 [PTadmin] Official Update 2012-01
// 
// 
// 3 16 0.9239 0 0.3827 1 0 0 1 0 1
  [3,16,0.9239,0,0.3827,1,0,0,1,0,1],
// 3 16 0.7071 0 0.7071 0.9239 0 0.3827 1 0 1
  [3,16,0.7071,0,0.7071,0.9239,0,0.3827,1,0,1],
// 3 16 0.3827 0 0.9239 0.7071 0 0.7071 1 0 1
  [3,16,0.3827,0,0.9239,0.7071,0,0.7071,1,0,1],
// 3 16 0 0 1 0.3827 0 0.9239 1 0 1
  [3,16,0,0,1,0.3827,0,0.9239,1,0,1],
// 3 16 -0.3827 0 0.9239 0 0 1 -1 0 1
  [3,16,-0.3827,0,0.9239,0,0,1,-1,0,1],
// 3 16 -0.7071 0 0.7071 -0.3827 0 0.9239 -1 0 1
  [3,16,-0.7071,0,0.7071,-0.3827,0,0.9239,-1,0,1],
// 3 16 -0.9239 0 0.3827 -0.7071 0 0.7071 -1 0 1
  [3,16,-0.9239,0,0.3827,-0.7071,0,0.7071,-1,0,1],
// 3 16 -1 0 0 -0.9239 0 0.3827 -1 0 1
  [3,16,-1,0,0,-0.9239,0,0.3827,-1,0,1],
// 3 16 -0.9239 0 -0.3827 -1 0 0 -1 0 -1
  [3,16,-0.9239,0,-0.3827,-1,0,0,-1,0,-1],
// 3 16 -0.7071 0 -0.7071 -0.9239 0 -0.3827 -1 0 -1
  [3,16,-0.7071,0,-0.7071,-0.9239,0,-0.3827,-1,0,-1],
// 3 16 -0.3827 0 -0.9239 -0.7071 0 -0.7071 -1 0 -1
  [3,16,-0.3827,0,-0.9239,-0.7071,0,-0.7071,-1,0,-1],
// 3 16 0 0 -1 -0.3827 0 -0.9239 -1 0 -1
  [3,16,0,0,-1,-0.3827,0,-0.9239,-1,0,-1],
// 3 16 0.3827 0 -0.9239 0 0 -1 1 0 -1
  [3,16,0.3827,0,-0.9239,0,0,-1,1,0,-1],
// 3 16 0.7071 0 -0.7071 0.3827 0 -0.9239 1 0 -1
  [3,16,0.7071,0,-0.7071,0.3827,0,-0.9239,1,0,-1],
// 3 16 0.9239 0 -0.3827 0.7071 0 -0.7071 1 0 -1
  [3,16,0.9239,0,-0.3827,0.7071,0,-0.7071,1,0,-1],
// 3 16 1 0 0 0.9239 0 -0.3827 1 0 -1
  [3,16,1,0,0,0.9239,0,-0.3827,1,0,-1],
];
module ldraw_lib__4_4ndis(step=0, col=false, unit=2/5, alt=false, line=0.2, solid=!$preview)
    makepoly(ldraw_lib__4_4ndis(solid), step=step, col=col, unit=unit, alt=alt, line=line, solid=solid);
ldraw_lib__4_4ndis(line=0.2);
// file: ../p/4-4disc.scad
use <../lib.scad>
$fa=1; $fs=0.2;
function ldraw_lib__4_4disc(realsolid=false) = [
// 0 Disc 1.0
// 0 Name: 4-4disc.dat
// 0 Author: James Jessiman
// 0 !LDRAW_ORG Primitive UPDATE 2002-02
// 0 !LICENSE Licensed under CC BY 2.0 and CC BY 4.0 : see CAreadme.txt
// 
// 0 BFC CERTIFY CCW
  [0,"BFC","CERTIFY"],
  [0,"BFC","CCW"],
// 
// 0 !HISTORY 1998-12-15 [PTadmin] Official Update 1998-10
// 0 !HISTORY 2002-03-23 [sbliss] Added BFC statement
// 0 !HISTORY 2002-04-25 [PTadmin] Official Update 2002-02
// 0 !HISTORY 2007-06-24 [PTadmin] Header formatted for Contributor Agreement
// 0 !HISTORY 2008-07-01 [PTadmin] Official Update 2008-01
// 
// 
// 3 16 0 0 0 1 0 0 0.9239 0 0.3827
  [3,16,0,0,0,1,0,0,0.9239,0,0.3827],
// 3 16 0 0 0 0.9239 0 0.3827 0.7071 0 0.7071
  [3,16,0,0,0,0.9239,0,0.3827,0.7071,0,0.7071],
// 3 16 0 0 0 0.7071 0 0.7071 0.3827 0 0.9239
  [3,16,0,0,0,0.7071,0,0.7071,0.3827,0,0.9239],
// 3 16 0 0 0 0.3827 0 0.9239 0 0 1
  [3,16,0,0,0,0.3827,0,0.9239,0,0,1],
// 3 16 0 0 0 0 0 1 -0.3827 0 0.9239
  [3,16,0,0,0,0,0,1,-0.3827,0,0.9239],
// 3 16 0 0 0 -0.3827 0 0.9239 -0.7071 0 0.7071
  [3,16,0,0,0,-0.3827,0,0.9239,-0.7071,0,0.7071],
// 3 16 0 0 0 -0.7071 0 0.7071 -0.9239 0 0.3827
  [3,16,0,0,0,-0.7071,0,0.7071,-0.9239,0,0.3827],
// 3 16 0 0 0 -0.9239 0 0.3827 -1 0 -0
  [3,16,0,0,0,-0.9239,0,0.3827,-1,0,-0],
// 3 16 0 0 0 -1 0 -0 -0.9239 0 -0.3827
  [3,16,0,0,0,-1,0,-0,-0.9239,0,-0.3827],
// 3 16 0 0 0 -0.9239 0 -0.3827 -0.7071 0 -0.7071
  [3,16,0,0,0,-0.9239,0,-0.3827,-0.7071,0,-0.7071],
// 3 16 0 0 0 -0.7071 0 -0.7071 -0.3827 0 -0.9239
  [3,16,0,0,0,-0.7071,0,-0.7071,-0.3827,0,-0.9239],
// 3 16 0 0 0 -0.3827 0 -0.9239 0 0 -1
  [3,16,0,0,0,-0.3827,0,-0.9239,0,0,-1],
// 3 16 0 0 0 0 0 -1 0.3827 0 -0.9239
  [3,16,0,0,0,0,0,-1,0.3827,0,-0.9239],
// 3 16 0 0 0 0.3827 0 -0.9239 0.7071 0 -0.7071
  [3,16,0,0,0,0.3827,0,-0.9239,0.7071,0,-0.7071],
// 3 16 0 0 0 0.7071 0 -0.7071 0.9239 0 -0.3827
  [3,16,0,0,0,0.7071,0,-0.7071,0.9239,0,-0.3827],
// 3 16 0 0 0 0.9239 0 -0.3827 1 0 0
  [3,16,0,0,0,0.9239,0,-0.3827,1,0,0],
// 0
];
module ldraw_lib__4_4disc(step=0, col=false, unit=2/5, alt=false, line=0.2, solid=!$preview)
    makepoly(ldraw_lib__4_4disc(solid), step=step, col=col, unit=unit, alt=alt, line=line, solid=solid);
ldraw_lib__4_4disc(line=0.2);
// main file
use <../lib.scad>
use <../p/4-4disc.scad>
use <../p/4-4ndis.scad>
use <../p/box5-12.scad>
$fa=1; $fs=0.2;
function ldraw_lib__194305c(realsolid=false) = [
// 0 Sticker  1.0 x  2.8 with Seven Red Circles and Seven White Squares on Black Background
// 0 Name: 194305c.dat
// 0 Author: Takeshi Takahashi [RainbowDolphin]
// 0 !LDRAW_ORG Part UPDATE 2022-06
// 0 !LICENSE Licensed under CC BY 2.0 and CC BY 4.0 : see CAreadme.txt
// 
// 0 BFC CERTIFY CCW
  [0,"BFC","CERTIFY"],
  [0,"BFC","CCW"],
// 
// 0 !KEYWORDS Bricklink 4025stk01, Brickowl 866936, Fire boat, Rebrickable 194305
// 0 !KEYWORDS Set 4025
// 
// 0 !HISTORY 2021-09-09 [RainbowDolphin] Created based on 192895b by Bjoern Sigve Storesund [Storesund]
// 0 !HISTORY 2022-12-20 [PTadmin] Official Update 2022-06
// 
// 
// 1 16 0 -0.25 0 28 0 0 0 0.25 0 0 0 10 box5-12.dat
  [1,16,0,-0.25,0,28,0,0,0,0.25,0,0,0,10, ldraw_lib__box5_12(realsolid)],
// 1 4 -7.2 -0.25 -1.5 2.5 0 0 0 1 0 0 0 2.5 4-4disc.dat
  [1,4,-7.2,-0.25,-1.5,2.5,0,0,0,1,0,0,0,2.5, ldraw_lib__4_4disc(realsolid)],
// 1 4 0 -0.25 -1.5 2.5 0 0 0 1 0 0 0 2.5 4-4disc.dat
  [1,4,0,-0.25,-1.5,2.5,0,0,0,1,0,0,0,2.5, ldraw_lib__4_4disc(realsolid)],
// 1 4 -14.2 -0.25 -1.5 2.5 0 0 0 1 0 0 0 2.5 4-4disc.dat
  [1,4,-14.2,-0.25,-1.5,2.5,0,0,0,1,0,0,0,2.5, ldraw_lib__4_4disc(realsolid)],
// 1 4 -21.2 -0.25 -1.5 2.5 0 0 0 1 0 0 0 2.5 4-4disc.dat
  [1,4,-21.2,-0.25,-1.5,2.5,0,0,0,1,0,0,0,2.5, ldraw_lib__4_4disc(realsolid)],
// 1 4 7.2 -0.25 -1.5 2.5 0 0 0 1 0 0 0 2.5 4-4disc.dat
  [1,4,7.2,-0.25,-1.5,2.5,0,0,0,1,0,0,0,2.5, ldraw_lib__4_4disc(realsolid)],
// 1 4 14.2 -0.25 -1.5 2.5 0 0 0 1 0 0 0 2.5 4-4disc.dat
  [1,4,14.2,-0.25,-1.5,2.5,0,0,0,1,0,0,0,2.5, ldraw_lib__4_4disc(realsolid)],
// 1 4 21.2 -0.25 -1.5 2.5 0 0 0 1 0 0 0 2.5 4-4disc.dat
  [1,4,21.2,-0.25,-1.5,2.5,0,0,0,1,0,0,0,2.5, ldraw_lib__4_4disc(realsolid)],
// 1 0 0 -0.25 -1.5 2.5 0 0 0 1 0 0 0 2.5 4-4ndis.dat
  [1,0,0,-0.25,-1.5,2.5,0,0,0,1,0,0,0,2.5, ldraw_lib__4_4ndis(realsolid)],
// 1 0 -7.2 -0.25 -1.5 2.5 0 0 0 1 0 0 0 2.5 4-4ndis.dat
  [1,0,-7.2,-0.25,-1.5,2.5,0,0,0,1,0,0,0,2.5, ldraw_lib__4_4ndis(realsolid)],
// 1 0 -14.2 -0.25 -1.5 2.5 0 0 0 1 0 0 0 2.5 4-4ndis.dat
  [1,0,-14.2,-0.25,-1.5,2.5,0,0,0,1,0,0,0,2.5, ldraw_lib__4_4ndis(realsolid)],
// 1 0 -21.2 -0.25 -1.5 2.5 0 0 0 1 0 0 0 2.5 4-4ndis.dat
  [1,0,-21.2,-0.25,-1.5,2.5,0,0,0,1,0,0,0,2.5, ldraw_lib__4_4ndis(realsolid)],
// 1 0 7.2 -0.25 -1.5 2.5 0 0 0 1 0 0 0 2.5 4-4ndis.dat
  [1,0,7.2,-0.25,-1.5,2.5,0,0,0,1,0,0,0,2.5, ldraw_lib__4_4ndis(realsolid)],
// 1 0 14.2 -0.25 -1.5 2.5 0 0 0 1 0 0 0 2.5 4-4ndis.dat
  [1,0,14.2,-0.25,-1.5,2.5,0,0,0,1,0,0,0,2.5, ldraw_lib__4_4ndis(realsolid)],
// 1 0 21.2 -0.25 -1.5 2.5 0 0 0 1 0 0 0 2.5 4-4ndis.dat
  [1,0,21.2,-0.25,-1.5,2.5,0,0,0,1,0,0,0,2.5, ldraw_lib__4_4ndis(realsolid)],
// 4 0 2.5 -0.25 3 4.7 -0.25 3 4.7 -0.25 7 2.5 -0.25 7
  [4,0,2.5,-0.25,3,4.7,-0.25,3,4.7,-0.25,7,2.5,-0.25,7],
// 4 0 9.7 -0.25 7 9.7 -0.25 3 11.7 -0.25 3 11.7 -0.25 7
  [4,0,9.7,-0.25,7,9.7,-0.25,3,11.7,-0.25,3,11.7,-0.25,7],
// 4 0 16.7 -0.25 3 18.7 -0.25 3 18.7 -0.25 7 16.7 -0.25 7
  [4,0,16.7,-0.25,3,18.7,-0.25,3,18.7,-0.25,7,16.7,-0.25,7],
// 4 0 -18.7 -0.25 3 -16.7 -0.25 3 -16.7 -0.25 7 -18.7 -0.25 7
  [4,0,-18.7,-0.25,3,-16.7,-0.25,3,-16.7,-0.25,7,-18.7,-0.25,7],
// 4 0 -11.7 -0.25 3 -9.7 -0.25 3 -9.7 -0.25 7 -11.7 -0.25 7
  [4,0,-11.7,-0.25,3,-9.7,-0.25,3,-9.7,-0.25,7,-11.7,-0.25,7],
// 4 0 -4.7 -0.25 3 -2.5 -0.25 3 -2.5 -0.25 7 -4.7 -0.25 7
  [4,0,-4.7,-0.25,3,-2.5,-0.25,3,-2.5,-0.25,7,-4.7,-0.25,7],
// 4 15 -18.7 -0.25 7 -23.7 -0.25 7 -23.7 -0.25 3 -18.7 -0.25 3
  [4,15,-18.7,-0.25,7,-23.7,-0.25,7,-23.7,-0.25,3,-18.7,-0.25,3],
// 4 15 -11.7 -0.25 7 -16.7 -0.25 7 -16.7 -0.25 3 -11.7 -0.25 3
  [4,15,-11.7,-0.25,7,-16.7,-0.25,7,-16.7,-0.25,3,-11.7,-0.25,3],
// 4 15 -4.7 -0.25 7 -9.7 -0.25 7 -9.7 -0.25 3 -4.7 -0.25 3
  [4,15,-4.7,-0.25,7,-9.7,-0.25,7,-9.7,-0.25,3,-4.7,-0.25,3],
// 4 15 2.5 -0.25 7 -2.5 -0.25 7 -2.5 -0.25 3 2.5 -0.25 3
  [4,15,2.5,-0.25,7,-2.5,-0.25,7,-2.5,-0.25,3,2.5,-0.25,3],
// 4 15 9.7 -0.25 7 4.7 -0.25 7 4.7 -0.25 3 9.7 -0.25 3
  [4,15,9.7,-0.25,7,4.7,-0.25,7,4.7,-0.25,3,9.7,-0.25,3],
// 4 15 16.7 -0.25 7 11.7 -0.25 7 11.7 -0.25 3 16.7 -0.25 3
  [4,15,16.7,-0.25,7,11.7,-0.25,7,11.7,-0.25,3,16.7,-0.25,3],
// 4 15 23.7 -0.25 7 18.7 -0.25 7 18.7 -0.25 3 23.7 -0.25 3
  [4,15,23.7,-0.25,7,18.7,-0.25,7,18.7,-0.25,3,23.7,-0.25,3],
// 4 0 -2.5 -0.25 7 28 -0.25 10 -28 -0.25 10 -4.7 -0.25 7
  [4,0,-2.5,-0.25,7,28,-0.25,10,-28,-0.25,10,-4.7,-0.25,7],
// 3 0 -28 -0.25 10 -9.7 -0.25 7 -4.7 -0.25 7
  [3,0,-28,-0.25,10,-9.7,-0.25,7,-4.7,-0.25,7],
// 3 0 -28 -0.25 10 -11.7 -0.25 7 -9.7 -0.25 7
  [3,0,-28,-0.25,10,-11.7,-0.25,7,-9.7,-0.25,7],
// 3 0 -28 -0.25 10 -16.7 -0.25 7 -11.7 -0.25 7
  [3,0,-28,-0.25,10,-16.7,-0.25,7,-11.7,-0.25,7],
// 3 0 -28 -0.25 10 -18.7 -0.25 7 -16.7 -0.25 7
  [3,0,-28,-0.25,10,-18.7,-0.25,7,-16.7,-0.25,7],
// 3 0 -28 -0.25 10 -23.7 -0.25 7 -18.7 -0.25 7
  [3,0,-28,-0.25,10,-23.7,-0.25,7,-18.7,-0.25,7],
// 3 0 -28 -0.25 10 -23.7 -0.25 3 -23.7 -0.25 7
  [3,0,-28,-0.25,10,-23.7,-0.25,3,-23.7,-0.25,7],
// 4 0 -23.7 -0.25 1 -23.7 -0.25 3 -28 -0.25 10 -28 -0.25 -10
  [4,0,-23.7,-0.25,1,-23.7,-0.25,3,-28,-0.25,10,-28,-0.25,-10],
// 3 0 -23.7 -0.25 1 -28 -0.25 -10 -23.7 -0.25 -1.5
  [3,0,-23.7,-0.25,1,-28,-0.25,-10,-23.7,-0.25,-1.5],
// 3 0 -23.7 -0.25 -1.5 -28 -0.25 -10 -23.7 -0.25 -4
  [3,0,-23.7,-0.25,-1.5,-28,-0.25,-10,-23.7,-0.25,-4],
// 3 0 -21.2 -0.25 -4 -23.7 -0.25 -4 -28 -0.25 -10
  [3,0,-21.2,-0.25,-4,-23.7,-0.25,-4,-28,-0.25,-10],
// 3 0 -18.7 -0.25 -4 -21.2 -0.25 -4 -28 -0.25 -10
  [3,0,-18.7,-0.25,-4,-21.2,-0.25,-4,-28,-0.25,-10],
// 3 0 -16.7 -0.25 -4 -18.7 -0.25 -4 -28 -0.25 -10
  [3,0,-16.7,-0.25,-4,-18.7,-0.25,-4,-28,-0.25,-10],
// 3 0 -14.2 -0.25 -4 -16.7 -0.25 -4 -28 -0.25 -10
  [3,0,-14.2,-0.25,-4,-16.7,-0.25,-4,-28,-0.25,-10],
// 3 0 -11.7 -0.25 -4 -14.2 -0.25 -4 -28 -0.25 -10
  [3,0,-11.7,-0.25,-4,-14.2,-0.25,-4,-28,-0.25,-10],
// 3 0 -9.7 -0.25 -4 -11.7 -0.25 -4 -28 -0.25 -10
  [3,0,-9.7,-0.25,-4,-11.7,-0.25,-4,-28,-0.25,-10],
// 3 0 -7.2 -0.25 -4 -9.7 -0.25 -4 -28 -0.25 -10
  [3,0,-7.2,-0.25,-4,-9.7,-0.25,-4,-28,-0.25,-10],
// 3 0 -4.7 -0.25 -4 -7.2 -0.25 -4 -28 -0.25 -10
  [3,0,-4.7,-0.25,-4,-7.2,-0.25,-4,-28,-0.25,-10],
// 3 0 -2.5 -0.25 -4 -4.7 -0.25 -4 -28 -0.25 -10
  [3,0,-2.5,-0.25,-4,-4.7,-0.25,-4,-28,-0.25,-10],
// 4 0 0 -0.25 -4 -2.5 -0.25 -4 -28 -0.25 -10 28 -0.25 -10
  [4,0,0,-0.25,-4,-2.5,-0.25,-4,-28,-0.25,-10,28,-0.25,-10],
// 3 0 2.5 -0.25 -4 0 -0.25 -4 28 -0.25 -10
  [3,0,2.5,-0.25,-4,0,-0.25,-4,28,-0.25,-10],
// 3 0 4.7 -0.25 -4 2.5 -0.25 -4 28 -0.25 -10
  [3,0,4.7,-0.25,-4,2.5,-0.25,-4,28,-0.25,-10],
// 3 0 7.2 -0.25 -4 4.7 -0.25 -4 28 -0.25 -10
  [3,0,7.2,-0.25,-4,4.7,-0.25,-4,28,-0.25,-10],
// 3 0 9.7 -0.25 -4 7.2 -0.25 -4 28 -0.25 -10
  [3,0,9.7,-0.25,-4,7.2,-0.25,-4,28,-0.25,-10],
// 3 0 11.7 -0.25 -4 9.7 -0.25 -4 28 -0.25 -10
  [3,0,11.7,-0.25,-4,9.7,-0.25,-4,28,-0.25,-10],
// 3 0 14.2 -0.25 -4 11.7 -0.25 -4 28 -0.25 -10
  [3,0,14.2,-0.25,-4,11.7,-0.25,-4,28,-0.25,-10],
// 3 0 16.7 -0.25 -4 14.2 -0.25 -4 28 -0.25 -10
  [3,0,16.7,-0.25,-4,14.2,-0.25,-4,28,-0.25,-10],
// 3 0 18.7 -0.25 -4 16.7 -0.25 -4 28 -0.25 -10
  [3,0,18.7,-0.25,-4,16.7,-0.25,-4,28,-0.25,-10],
// 3 0 21.2 -0.25 -4 18.7 -0.25 -4 28 -0.25 -10
  [3,0,21.2,-0.25,-4,18.7,-0.25,-4,28,-0.25,-10],
// 3 0 23.7 -0.25 -4 21.2 -0.25 -4 28 -0.25 -10
  [3,0,23.7,-0.25,-4,21.2,-0.25,-4,28,-0.25,-10],
// 3 0 23.7 -0.25 -1.5 23.7 -0.25 -4 28 -0.25 -10
  [3,0,23.7,-0.25,-1.5,23.7,-0.25,-4,28,-0.25,-10],
// 4 0 23.7 -0.25 1 23.7 -0.25 -1.5 28 -0.25 -10 28 -0.25 10
  [4,0,23.7,-0.25,1,23.7,-0.25,-1.5,28,-0.25,-10,28,-0.25,10],
// 3 0 28 -0.25 10 23.7 -0.25 3 23.7 -0.25 1
  [3,0,28,-0.25,10,23.7,-0.25,3,23.7,-0.25,1],
// 3 0 28 -0.25 10 23.7 -0.25 7 23.7 -0.25 3
  [3,0,28,-0.25,10,23.7,-0.25,7,23.7,-0.25,3],
// 3 0 28 -0.25 10 18.7 -0.25 7 23.7 -0.25 7
  [3,0,28,-0.25,10,18.7,-0.25,7,23.7,-0.25,7],
// 3 0 28 -0.25 10 16.7 -0.25 7 18.7 -0.25 7
  [3,0,28,-0.25,10,16.7,-0.25,7,18.7,-0.25,7],
// 3 0 28 -0.25 10 11.7 -0.25 7 16.7 -0.25 7
  [3,0,28,-0.25,10,11.7,-0.25,7,16.7,-0.25,7],
// 3 0 28 -0.25 10 9.7 -0.25 7 11.7 -0.25 7
  [3,0,28,-0.25,10,9.7,-0.25,7,11.7,-0.25,7],
// 3 0 28 -0.25 10 4.7 -0.25 7 9.7 -0.25 7
  [3,0,28,-0.25,10,4.7,-0.25,7,9.7,-0.25,7],
// 3 0 28 -0.25 10 2.5 -0.25 7 4.7 -0.25 7
  [3,0,28,-0.25,10,2.5,-0.25,7,4.7,-0.25,7],
// 3 0 28 -0.25 10 -2.5 -0.25 7 2.5 -0.25 7
  [3,0,28,-0.25,10,-2.5,-0.25,7,2.5,-0.25,7],
// 4 0 -23.7 -0.25 3 -23.7 -0.25 1 -21.2 -0.25 1 -18.7 -0.25 3
  [4,0,-23.7,-0.25,3,-23.7,-0.25,1,-21.2,-0.25,1,-18.7,-0.25,3],
// 4 0 -18.7 -0.25 3 -21.2 -0.25 1 -18.7 -0.25 1 -16.7 -0.25 3
  [4,0,-18.7,-0.25,3,-21.2,-0.25,1,-18.7,-0.25,1,-16.7,-0.25,3],
// 4 0 -16.7 -0.25 1 -16.7 -0.25 3 -18.7 -0.25 1 -18.7 -0.25 -1.5
  [4,0,-16.7,-0.25,1,-16.7,-0.25,3,-18.7,-0.25,1,-18.7,-0.25,-1.5],
// 4 0 -16.7 -0.25 -1.5 -16.7 -0.25 1 -18.7 -0.25 -1.5 -18.7 -0.25 -4
  [4,0,-16.7,-0.25,-1.5,-16.7,-0.25,1,-18.7,-0.25,-1.5,-18.7,-0.25,-4],
// 3 0 -16.7 -0.25 -1.5 -18.7 -0.25 -4 -16.7 -0.25 -4
  [3,0,-16.7,-0.25,-1.5,-18.7,-0.25,-4,-16.7,-0.25,-4],
// 4 0 -16.7 -0.25 3 -16.7 -0.25 1 -14.2 -0.25 1 -11.7 -0.25 3
  [4,0,-16.7,-0.25,3,-16.7,-0.25,1,-14.2,-0.25,1,-11.7,-0.25,3],
// 4 0 -11.7 -0.25 3 -14.2 -0.25 1 -11.7 -0.25 1 -9.7 -0.25 3
  [4,0,-11.7,-0.25,3,-14.2,-0.25,1,-11.7,-0.25,1,-9.7,-0.25,3],
// 4 0 -9.7 -0.25 1 -9.7 -0.25 3 -11.7 -0.25 1 -11.7 -0.25 -1.5
  [4,0,-9.7,-0.25,1,-9.7,-0.25,3,-11.7,-0.25,1,-11.7,-0.25,-1.5],
// 4 0 -9.7 -0.25 -1.5 -9.7 -0.25 1 -11.7 -0.25 -1.5 -11.7 -0.25 -4
  [4,0,-9.7,-0.25,-1.5,-9.7,-0.25,1,-11.7,-0.25,-1.5,-11.7,-0.25,-4],
// 3 0 -9.7 -0.25 -1.5 -11.7 -0.25 -4 -9.7 -0.25 -4
  [3,0,-9.7,-0.25,-1.5,-11.7,-0.25,-4,-9.7,-0.25,-4],
// 4 0 -9.7 -0.25 3 -9.7 -0.25 1 -7.2 -0.25 1 -4.7 -0.25 3
  [4,0,-9.7,-0.25,3,-9.7,-0.25,1,-7.2,-0.25,1,-4.7,-0.25,3],
// 4 0 -4.7 -0.25 3 -7.2 -0.25 1 -4.7 -0.25 1 -2.5 -0.25 3
  [4,0,-4.7,-0.25,3,-7.2,-0.25,1,-4.7,-0.25,1,-2.5,-0.25,3],
// 4 0 -2.5 -0.25 1 -2.5 -0.25 3 -4.7 -0.25 1 -4.7 -0.25 -1.5
  [4,0,-2.5,-0.25,1,-2.5,-0.25,3,-4.7,-0.25,1,-4.7,-0.25,-1.5],
// 4 0 -2.5 -0.25 -1.5 -2.5 -0.25 1 -4.7 -0.25 -1.5 -4.7 -0.25 -4
  [4,0,-2.5,-0.25,-1.5,-2.5,-0.25,1,-4.7,-0.25,-1.5,-4.7,-0.25,-4],
// 3 0 -2.5 -0.25 -1.5 -4.7 -0.25 -4 -2.5 -0.25 -4
  [3,0,-2.5,-0.25,-1.5,-4.7,-0.25,-4,-2.5,-0.25,-4],
// 4 0 -2.5 -0.25 3 -2.5 -0.25 1 0 -0.25 1 2.5 -0.25 3
  [4,0,-2.5,-0.25,3,-2.5,-0.25,1,0,-0.25,1,2.5,-0.25,3],
// 4 0 2.5 -0.25 3 0 -0.25 1 2.5 -0.25 1 4.7 -0.25 3
  [4,0,2.5,-0.25,3,0,-0.25,1,2.5,-0.25,1,4.7,-0.25,3],
// 4 0 4.7 -0.25 1 4.7 -0.25 3 2.5 -0.25 1 2.5 -0.25 -1.5
  [4,0,4.7,-0.25,1,4.7,-0.25,3,2.5,-0.25,1,2.5,-0.25,-1.5],
// 4 0 4.7 -0.25 -1.5 4.7 -0.25 1 2.5 -0.25 -1.5 2.5 -0.25 -4
  [4,0,4.7,-0.25,-1.5,4.7,-0.25,1,2.5,-0.25,-1.5,2.5,-0.25,-4],
// 3 0 4.7 -0.25 -1.5 2.5 -0.25 -4 4.7 -0.25 -4
  [3,0,4.7,-0.25,-1.5,2.5,-0.25,-4,4.7,-0.25,-4],
// 4 0 4.7 -0.25 3 4.7 -0.25 1 7.2 -0.25 1 9.7 -0.25 3
  [4,0,4.7,-0.25,3,4.7,-0.25,1,7.2,-0.25,1,9.7,-0.25,3],
// 4 0 9.7 -0.25 3 7.2 -0.25 1 9.7 -0.25 1 11.7 -0.25 3
  [4,0,9.7,-0.25,3,7.2,-0.25,1,9.7,-0.25,1,11.7,-0.25,3],
// 4 0 11.7 -0.25 1 11.7 -0.25 3 9.7 -0.25 1 9.7 -0.25 -1.5
  [4,0,11.7,-0.25,1,11.7,-0.25,3,9.7,-0.25,1,9.7,-0.25,-1.5],
// 4 0 11.7 -0.25 -1.5 11.7 -0.25 1 9.7 -0.25 -1.5 9.7 -0.25 -4
  [4,0,11.7,-0.25,-1.5,11.7,-0.25,1,9.7,-0.25,-1.5,9.7,-0.25,-4],
// 3 0 11.7 -0.25 -1.5 9.7 -0.25 -4 11.7 -0.25 -4
  [3,0,11.7,-0.25,-1.5,9.7,-0.25,-4,11.7,-0.25,-4],
// 4 0 11.7 -0.25 3 11.7 -0.25 1 14.2 -0.25 1 16.7 -0.25 3
  [4,0,11.7,-0.25,3,11.7,-0.25,1,14.2,-0.25,1,16.7,-0.25,3],
// 4 0 16.7 -0.25 3 14.2 -0.25 1 16.7 -0.25 1 18.7 -0.25 3
  [4,0,16.7,-0.25,3,14.2,-0.25,1,16.7,-0.25,1,18.7,-0.25,3],
// 4 0 18.7 -0.25 1 18.7 -0.25 3 16.7 -0.25 1 16.7 -0.25 -1.5
  [4,0,18.7,-0.25,1,18.7,-0.25,3,16.7,-0.25,1,16.7,-0.25,-1.5],
// 4 0 18.7 -0.25 -1.5 18.7 -0.25 1 16.7 -0.25 -1.5 16.7 -0.25 -4
  [4,0,18.7,-0.25,-1.5,18.7,-0.25,1,16.7,-0.25,-1.5,16.7,-0.25,-4],
// 3 0 18.7 -0.25 -1.5 16.7 -0.25 -4 18.7 -0.25 -4
  [3,0,18.7,-0.25,-1.5,16.7,-0.25,-4,18.7,-0.25,-4],
// 4 0 18.7 -0.25 3 18.7 -0.25 1 21.2 -0.25 1 23.7 -0.25 3
  [4,0,18.7,-0.25,3,18.7,-0.25,1,21.2,-0.25,1,23.7,-0.25,3],
// 3 0 23.7 -0.25 3 21.2 -0.25 1 23.7 -0.25 1
  [3,0,23.7,-0.25,3,21.2,-0.25,1,23.7,-0.25,1],
];
module ldraw_lib__194305c(step=0, col=false, unit=2/5, alt=false, line=0.2, solid=!$preview)
    makepoly(ldraw_lib__194305c(solid), step=step, col=col, unit=unit, alt=alt, line=line, solid=solid);
ldraw_lib__194305c(line=0.2);
